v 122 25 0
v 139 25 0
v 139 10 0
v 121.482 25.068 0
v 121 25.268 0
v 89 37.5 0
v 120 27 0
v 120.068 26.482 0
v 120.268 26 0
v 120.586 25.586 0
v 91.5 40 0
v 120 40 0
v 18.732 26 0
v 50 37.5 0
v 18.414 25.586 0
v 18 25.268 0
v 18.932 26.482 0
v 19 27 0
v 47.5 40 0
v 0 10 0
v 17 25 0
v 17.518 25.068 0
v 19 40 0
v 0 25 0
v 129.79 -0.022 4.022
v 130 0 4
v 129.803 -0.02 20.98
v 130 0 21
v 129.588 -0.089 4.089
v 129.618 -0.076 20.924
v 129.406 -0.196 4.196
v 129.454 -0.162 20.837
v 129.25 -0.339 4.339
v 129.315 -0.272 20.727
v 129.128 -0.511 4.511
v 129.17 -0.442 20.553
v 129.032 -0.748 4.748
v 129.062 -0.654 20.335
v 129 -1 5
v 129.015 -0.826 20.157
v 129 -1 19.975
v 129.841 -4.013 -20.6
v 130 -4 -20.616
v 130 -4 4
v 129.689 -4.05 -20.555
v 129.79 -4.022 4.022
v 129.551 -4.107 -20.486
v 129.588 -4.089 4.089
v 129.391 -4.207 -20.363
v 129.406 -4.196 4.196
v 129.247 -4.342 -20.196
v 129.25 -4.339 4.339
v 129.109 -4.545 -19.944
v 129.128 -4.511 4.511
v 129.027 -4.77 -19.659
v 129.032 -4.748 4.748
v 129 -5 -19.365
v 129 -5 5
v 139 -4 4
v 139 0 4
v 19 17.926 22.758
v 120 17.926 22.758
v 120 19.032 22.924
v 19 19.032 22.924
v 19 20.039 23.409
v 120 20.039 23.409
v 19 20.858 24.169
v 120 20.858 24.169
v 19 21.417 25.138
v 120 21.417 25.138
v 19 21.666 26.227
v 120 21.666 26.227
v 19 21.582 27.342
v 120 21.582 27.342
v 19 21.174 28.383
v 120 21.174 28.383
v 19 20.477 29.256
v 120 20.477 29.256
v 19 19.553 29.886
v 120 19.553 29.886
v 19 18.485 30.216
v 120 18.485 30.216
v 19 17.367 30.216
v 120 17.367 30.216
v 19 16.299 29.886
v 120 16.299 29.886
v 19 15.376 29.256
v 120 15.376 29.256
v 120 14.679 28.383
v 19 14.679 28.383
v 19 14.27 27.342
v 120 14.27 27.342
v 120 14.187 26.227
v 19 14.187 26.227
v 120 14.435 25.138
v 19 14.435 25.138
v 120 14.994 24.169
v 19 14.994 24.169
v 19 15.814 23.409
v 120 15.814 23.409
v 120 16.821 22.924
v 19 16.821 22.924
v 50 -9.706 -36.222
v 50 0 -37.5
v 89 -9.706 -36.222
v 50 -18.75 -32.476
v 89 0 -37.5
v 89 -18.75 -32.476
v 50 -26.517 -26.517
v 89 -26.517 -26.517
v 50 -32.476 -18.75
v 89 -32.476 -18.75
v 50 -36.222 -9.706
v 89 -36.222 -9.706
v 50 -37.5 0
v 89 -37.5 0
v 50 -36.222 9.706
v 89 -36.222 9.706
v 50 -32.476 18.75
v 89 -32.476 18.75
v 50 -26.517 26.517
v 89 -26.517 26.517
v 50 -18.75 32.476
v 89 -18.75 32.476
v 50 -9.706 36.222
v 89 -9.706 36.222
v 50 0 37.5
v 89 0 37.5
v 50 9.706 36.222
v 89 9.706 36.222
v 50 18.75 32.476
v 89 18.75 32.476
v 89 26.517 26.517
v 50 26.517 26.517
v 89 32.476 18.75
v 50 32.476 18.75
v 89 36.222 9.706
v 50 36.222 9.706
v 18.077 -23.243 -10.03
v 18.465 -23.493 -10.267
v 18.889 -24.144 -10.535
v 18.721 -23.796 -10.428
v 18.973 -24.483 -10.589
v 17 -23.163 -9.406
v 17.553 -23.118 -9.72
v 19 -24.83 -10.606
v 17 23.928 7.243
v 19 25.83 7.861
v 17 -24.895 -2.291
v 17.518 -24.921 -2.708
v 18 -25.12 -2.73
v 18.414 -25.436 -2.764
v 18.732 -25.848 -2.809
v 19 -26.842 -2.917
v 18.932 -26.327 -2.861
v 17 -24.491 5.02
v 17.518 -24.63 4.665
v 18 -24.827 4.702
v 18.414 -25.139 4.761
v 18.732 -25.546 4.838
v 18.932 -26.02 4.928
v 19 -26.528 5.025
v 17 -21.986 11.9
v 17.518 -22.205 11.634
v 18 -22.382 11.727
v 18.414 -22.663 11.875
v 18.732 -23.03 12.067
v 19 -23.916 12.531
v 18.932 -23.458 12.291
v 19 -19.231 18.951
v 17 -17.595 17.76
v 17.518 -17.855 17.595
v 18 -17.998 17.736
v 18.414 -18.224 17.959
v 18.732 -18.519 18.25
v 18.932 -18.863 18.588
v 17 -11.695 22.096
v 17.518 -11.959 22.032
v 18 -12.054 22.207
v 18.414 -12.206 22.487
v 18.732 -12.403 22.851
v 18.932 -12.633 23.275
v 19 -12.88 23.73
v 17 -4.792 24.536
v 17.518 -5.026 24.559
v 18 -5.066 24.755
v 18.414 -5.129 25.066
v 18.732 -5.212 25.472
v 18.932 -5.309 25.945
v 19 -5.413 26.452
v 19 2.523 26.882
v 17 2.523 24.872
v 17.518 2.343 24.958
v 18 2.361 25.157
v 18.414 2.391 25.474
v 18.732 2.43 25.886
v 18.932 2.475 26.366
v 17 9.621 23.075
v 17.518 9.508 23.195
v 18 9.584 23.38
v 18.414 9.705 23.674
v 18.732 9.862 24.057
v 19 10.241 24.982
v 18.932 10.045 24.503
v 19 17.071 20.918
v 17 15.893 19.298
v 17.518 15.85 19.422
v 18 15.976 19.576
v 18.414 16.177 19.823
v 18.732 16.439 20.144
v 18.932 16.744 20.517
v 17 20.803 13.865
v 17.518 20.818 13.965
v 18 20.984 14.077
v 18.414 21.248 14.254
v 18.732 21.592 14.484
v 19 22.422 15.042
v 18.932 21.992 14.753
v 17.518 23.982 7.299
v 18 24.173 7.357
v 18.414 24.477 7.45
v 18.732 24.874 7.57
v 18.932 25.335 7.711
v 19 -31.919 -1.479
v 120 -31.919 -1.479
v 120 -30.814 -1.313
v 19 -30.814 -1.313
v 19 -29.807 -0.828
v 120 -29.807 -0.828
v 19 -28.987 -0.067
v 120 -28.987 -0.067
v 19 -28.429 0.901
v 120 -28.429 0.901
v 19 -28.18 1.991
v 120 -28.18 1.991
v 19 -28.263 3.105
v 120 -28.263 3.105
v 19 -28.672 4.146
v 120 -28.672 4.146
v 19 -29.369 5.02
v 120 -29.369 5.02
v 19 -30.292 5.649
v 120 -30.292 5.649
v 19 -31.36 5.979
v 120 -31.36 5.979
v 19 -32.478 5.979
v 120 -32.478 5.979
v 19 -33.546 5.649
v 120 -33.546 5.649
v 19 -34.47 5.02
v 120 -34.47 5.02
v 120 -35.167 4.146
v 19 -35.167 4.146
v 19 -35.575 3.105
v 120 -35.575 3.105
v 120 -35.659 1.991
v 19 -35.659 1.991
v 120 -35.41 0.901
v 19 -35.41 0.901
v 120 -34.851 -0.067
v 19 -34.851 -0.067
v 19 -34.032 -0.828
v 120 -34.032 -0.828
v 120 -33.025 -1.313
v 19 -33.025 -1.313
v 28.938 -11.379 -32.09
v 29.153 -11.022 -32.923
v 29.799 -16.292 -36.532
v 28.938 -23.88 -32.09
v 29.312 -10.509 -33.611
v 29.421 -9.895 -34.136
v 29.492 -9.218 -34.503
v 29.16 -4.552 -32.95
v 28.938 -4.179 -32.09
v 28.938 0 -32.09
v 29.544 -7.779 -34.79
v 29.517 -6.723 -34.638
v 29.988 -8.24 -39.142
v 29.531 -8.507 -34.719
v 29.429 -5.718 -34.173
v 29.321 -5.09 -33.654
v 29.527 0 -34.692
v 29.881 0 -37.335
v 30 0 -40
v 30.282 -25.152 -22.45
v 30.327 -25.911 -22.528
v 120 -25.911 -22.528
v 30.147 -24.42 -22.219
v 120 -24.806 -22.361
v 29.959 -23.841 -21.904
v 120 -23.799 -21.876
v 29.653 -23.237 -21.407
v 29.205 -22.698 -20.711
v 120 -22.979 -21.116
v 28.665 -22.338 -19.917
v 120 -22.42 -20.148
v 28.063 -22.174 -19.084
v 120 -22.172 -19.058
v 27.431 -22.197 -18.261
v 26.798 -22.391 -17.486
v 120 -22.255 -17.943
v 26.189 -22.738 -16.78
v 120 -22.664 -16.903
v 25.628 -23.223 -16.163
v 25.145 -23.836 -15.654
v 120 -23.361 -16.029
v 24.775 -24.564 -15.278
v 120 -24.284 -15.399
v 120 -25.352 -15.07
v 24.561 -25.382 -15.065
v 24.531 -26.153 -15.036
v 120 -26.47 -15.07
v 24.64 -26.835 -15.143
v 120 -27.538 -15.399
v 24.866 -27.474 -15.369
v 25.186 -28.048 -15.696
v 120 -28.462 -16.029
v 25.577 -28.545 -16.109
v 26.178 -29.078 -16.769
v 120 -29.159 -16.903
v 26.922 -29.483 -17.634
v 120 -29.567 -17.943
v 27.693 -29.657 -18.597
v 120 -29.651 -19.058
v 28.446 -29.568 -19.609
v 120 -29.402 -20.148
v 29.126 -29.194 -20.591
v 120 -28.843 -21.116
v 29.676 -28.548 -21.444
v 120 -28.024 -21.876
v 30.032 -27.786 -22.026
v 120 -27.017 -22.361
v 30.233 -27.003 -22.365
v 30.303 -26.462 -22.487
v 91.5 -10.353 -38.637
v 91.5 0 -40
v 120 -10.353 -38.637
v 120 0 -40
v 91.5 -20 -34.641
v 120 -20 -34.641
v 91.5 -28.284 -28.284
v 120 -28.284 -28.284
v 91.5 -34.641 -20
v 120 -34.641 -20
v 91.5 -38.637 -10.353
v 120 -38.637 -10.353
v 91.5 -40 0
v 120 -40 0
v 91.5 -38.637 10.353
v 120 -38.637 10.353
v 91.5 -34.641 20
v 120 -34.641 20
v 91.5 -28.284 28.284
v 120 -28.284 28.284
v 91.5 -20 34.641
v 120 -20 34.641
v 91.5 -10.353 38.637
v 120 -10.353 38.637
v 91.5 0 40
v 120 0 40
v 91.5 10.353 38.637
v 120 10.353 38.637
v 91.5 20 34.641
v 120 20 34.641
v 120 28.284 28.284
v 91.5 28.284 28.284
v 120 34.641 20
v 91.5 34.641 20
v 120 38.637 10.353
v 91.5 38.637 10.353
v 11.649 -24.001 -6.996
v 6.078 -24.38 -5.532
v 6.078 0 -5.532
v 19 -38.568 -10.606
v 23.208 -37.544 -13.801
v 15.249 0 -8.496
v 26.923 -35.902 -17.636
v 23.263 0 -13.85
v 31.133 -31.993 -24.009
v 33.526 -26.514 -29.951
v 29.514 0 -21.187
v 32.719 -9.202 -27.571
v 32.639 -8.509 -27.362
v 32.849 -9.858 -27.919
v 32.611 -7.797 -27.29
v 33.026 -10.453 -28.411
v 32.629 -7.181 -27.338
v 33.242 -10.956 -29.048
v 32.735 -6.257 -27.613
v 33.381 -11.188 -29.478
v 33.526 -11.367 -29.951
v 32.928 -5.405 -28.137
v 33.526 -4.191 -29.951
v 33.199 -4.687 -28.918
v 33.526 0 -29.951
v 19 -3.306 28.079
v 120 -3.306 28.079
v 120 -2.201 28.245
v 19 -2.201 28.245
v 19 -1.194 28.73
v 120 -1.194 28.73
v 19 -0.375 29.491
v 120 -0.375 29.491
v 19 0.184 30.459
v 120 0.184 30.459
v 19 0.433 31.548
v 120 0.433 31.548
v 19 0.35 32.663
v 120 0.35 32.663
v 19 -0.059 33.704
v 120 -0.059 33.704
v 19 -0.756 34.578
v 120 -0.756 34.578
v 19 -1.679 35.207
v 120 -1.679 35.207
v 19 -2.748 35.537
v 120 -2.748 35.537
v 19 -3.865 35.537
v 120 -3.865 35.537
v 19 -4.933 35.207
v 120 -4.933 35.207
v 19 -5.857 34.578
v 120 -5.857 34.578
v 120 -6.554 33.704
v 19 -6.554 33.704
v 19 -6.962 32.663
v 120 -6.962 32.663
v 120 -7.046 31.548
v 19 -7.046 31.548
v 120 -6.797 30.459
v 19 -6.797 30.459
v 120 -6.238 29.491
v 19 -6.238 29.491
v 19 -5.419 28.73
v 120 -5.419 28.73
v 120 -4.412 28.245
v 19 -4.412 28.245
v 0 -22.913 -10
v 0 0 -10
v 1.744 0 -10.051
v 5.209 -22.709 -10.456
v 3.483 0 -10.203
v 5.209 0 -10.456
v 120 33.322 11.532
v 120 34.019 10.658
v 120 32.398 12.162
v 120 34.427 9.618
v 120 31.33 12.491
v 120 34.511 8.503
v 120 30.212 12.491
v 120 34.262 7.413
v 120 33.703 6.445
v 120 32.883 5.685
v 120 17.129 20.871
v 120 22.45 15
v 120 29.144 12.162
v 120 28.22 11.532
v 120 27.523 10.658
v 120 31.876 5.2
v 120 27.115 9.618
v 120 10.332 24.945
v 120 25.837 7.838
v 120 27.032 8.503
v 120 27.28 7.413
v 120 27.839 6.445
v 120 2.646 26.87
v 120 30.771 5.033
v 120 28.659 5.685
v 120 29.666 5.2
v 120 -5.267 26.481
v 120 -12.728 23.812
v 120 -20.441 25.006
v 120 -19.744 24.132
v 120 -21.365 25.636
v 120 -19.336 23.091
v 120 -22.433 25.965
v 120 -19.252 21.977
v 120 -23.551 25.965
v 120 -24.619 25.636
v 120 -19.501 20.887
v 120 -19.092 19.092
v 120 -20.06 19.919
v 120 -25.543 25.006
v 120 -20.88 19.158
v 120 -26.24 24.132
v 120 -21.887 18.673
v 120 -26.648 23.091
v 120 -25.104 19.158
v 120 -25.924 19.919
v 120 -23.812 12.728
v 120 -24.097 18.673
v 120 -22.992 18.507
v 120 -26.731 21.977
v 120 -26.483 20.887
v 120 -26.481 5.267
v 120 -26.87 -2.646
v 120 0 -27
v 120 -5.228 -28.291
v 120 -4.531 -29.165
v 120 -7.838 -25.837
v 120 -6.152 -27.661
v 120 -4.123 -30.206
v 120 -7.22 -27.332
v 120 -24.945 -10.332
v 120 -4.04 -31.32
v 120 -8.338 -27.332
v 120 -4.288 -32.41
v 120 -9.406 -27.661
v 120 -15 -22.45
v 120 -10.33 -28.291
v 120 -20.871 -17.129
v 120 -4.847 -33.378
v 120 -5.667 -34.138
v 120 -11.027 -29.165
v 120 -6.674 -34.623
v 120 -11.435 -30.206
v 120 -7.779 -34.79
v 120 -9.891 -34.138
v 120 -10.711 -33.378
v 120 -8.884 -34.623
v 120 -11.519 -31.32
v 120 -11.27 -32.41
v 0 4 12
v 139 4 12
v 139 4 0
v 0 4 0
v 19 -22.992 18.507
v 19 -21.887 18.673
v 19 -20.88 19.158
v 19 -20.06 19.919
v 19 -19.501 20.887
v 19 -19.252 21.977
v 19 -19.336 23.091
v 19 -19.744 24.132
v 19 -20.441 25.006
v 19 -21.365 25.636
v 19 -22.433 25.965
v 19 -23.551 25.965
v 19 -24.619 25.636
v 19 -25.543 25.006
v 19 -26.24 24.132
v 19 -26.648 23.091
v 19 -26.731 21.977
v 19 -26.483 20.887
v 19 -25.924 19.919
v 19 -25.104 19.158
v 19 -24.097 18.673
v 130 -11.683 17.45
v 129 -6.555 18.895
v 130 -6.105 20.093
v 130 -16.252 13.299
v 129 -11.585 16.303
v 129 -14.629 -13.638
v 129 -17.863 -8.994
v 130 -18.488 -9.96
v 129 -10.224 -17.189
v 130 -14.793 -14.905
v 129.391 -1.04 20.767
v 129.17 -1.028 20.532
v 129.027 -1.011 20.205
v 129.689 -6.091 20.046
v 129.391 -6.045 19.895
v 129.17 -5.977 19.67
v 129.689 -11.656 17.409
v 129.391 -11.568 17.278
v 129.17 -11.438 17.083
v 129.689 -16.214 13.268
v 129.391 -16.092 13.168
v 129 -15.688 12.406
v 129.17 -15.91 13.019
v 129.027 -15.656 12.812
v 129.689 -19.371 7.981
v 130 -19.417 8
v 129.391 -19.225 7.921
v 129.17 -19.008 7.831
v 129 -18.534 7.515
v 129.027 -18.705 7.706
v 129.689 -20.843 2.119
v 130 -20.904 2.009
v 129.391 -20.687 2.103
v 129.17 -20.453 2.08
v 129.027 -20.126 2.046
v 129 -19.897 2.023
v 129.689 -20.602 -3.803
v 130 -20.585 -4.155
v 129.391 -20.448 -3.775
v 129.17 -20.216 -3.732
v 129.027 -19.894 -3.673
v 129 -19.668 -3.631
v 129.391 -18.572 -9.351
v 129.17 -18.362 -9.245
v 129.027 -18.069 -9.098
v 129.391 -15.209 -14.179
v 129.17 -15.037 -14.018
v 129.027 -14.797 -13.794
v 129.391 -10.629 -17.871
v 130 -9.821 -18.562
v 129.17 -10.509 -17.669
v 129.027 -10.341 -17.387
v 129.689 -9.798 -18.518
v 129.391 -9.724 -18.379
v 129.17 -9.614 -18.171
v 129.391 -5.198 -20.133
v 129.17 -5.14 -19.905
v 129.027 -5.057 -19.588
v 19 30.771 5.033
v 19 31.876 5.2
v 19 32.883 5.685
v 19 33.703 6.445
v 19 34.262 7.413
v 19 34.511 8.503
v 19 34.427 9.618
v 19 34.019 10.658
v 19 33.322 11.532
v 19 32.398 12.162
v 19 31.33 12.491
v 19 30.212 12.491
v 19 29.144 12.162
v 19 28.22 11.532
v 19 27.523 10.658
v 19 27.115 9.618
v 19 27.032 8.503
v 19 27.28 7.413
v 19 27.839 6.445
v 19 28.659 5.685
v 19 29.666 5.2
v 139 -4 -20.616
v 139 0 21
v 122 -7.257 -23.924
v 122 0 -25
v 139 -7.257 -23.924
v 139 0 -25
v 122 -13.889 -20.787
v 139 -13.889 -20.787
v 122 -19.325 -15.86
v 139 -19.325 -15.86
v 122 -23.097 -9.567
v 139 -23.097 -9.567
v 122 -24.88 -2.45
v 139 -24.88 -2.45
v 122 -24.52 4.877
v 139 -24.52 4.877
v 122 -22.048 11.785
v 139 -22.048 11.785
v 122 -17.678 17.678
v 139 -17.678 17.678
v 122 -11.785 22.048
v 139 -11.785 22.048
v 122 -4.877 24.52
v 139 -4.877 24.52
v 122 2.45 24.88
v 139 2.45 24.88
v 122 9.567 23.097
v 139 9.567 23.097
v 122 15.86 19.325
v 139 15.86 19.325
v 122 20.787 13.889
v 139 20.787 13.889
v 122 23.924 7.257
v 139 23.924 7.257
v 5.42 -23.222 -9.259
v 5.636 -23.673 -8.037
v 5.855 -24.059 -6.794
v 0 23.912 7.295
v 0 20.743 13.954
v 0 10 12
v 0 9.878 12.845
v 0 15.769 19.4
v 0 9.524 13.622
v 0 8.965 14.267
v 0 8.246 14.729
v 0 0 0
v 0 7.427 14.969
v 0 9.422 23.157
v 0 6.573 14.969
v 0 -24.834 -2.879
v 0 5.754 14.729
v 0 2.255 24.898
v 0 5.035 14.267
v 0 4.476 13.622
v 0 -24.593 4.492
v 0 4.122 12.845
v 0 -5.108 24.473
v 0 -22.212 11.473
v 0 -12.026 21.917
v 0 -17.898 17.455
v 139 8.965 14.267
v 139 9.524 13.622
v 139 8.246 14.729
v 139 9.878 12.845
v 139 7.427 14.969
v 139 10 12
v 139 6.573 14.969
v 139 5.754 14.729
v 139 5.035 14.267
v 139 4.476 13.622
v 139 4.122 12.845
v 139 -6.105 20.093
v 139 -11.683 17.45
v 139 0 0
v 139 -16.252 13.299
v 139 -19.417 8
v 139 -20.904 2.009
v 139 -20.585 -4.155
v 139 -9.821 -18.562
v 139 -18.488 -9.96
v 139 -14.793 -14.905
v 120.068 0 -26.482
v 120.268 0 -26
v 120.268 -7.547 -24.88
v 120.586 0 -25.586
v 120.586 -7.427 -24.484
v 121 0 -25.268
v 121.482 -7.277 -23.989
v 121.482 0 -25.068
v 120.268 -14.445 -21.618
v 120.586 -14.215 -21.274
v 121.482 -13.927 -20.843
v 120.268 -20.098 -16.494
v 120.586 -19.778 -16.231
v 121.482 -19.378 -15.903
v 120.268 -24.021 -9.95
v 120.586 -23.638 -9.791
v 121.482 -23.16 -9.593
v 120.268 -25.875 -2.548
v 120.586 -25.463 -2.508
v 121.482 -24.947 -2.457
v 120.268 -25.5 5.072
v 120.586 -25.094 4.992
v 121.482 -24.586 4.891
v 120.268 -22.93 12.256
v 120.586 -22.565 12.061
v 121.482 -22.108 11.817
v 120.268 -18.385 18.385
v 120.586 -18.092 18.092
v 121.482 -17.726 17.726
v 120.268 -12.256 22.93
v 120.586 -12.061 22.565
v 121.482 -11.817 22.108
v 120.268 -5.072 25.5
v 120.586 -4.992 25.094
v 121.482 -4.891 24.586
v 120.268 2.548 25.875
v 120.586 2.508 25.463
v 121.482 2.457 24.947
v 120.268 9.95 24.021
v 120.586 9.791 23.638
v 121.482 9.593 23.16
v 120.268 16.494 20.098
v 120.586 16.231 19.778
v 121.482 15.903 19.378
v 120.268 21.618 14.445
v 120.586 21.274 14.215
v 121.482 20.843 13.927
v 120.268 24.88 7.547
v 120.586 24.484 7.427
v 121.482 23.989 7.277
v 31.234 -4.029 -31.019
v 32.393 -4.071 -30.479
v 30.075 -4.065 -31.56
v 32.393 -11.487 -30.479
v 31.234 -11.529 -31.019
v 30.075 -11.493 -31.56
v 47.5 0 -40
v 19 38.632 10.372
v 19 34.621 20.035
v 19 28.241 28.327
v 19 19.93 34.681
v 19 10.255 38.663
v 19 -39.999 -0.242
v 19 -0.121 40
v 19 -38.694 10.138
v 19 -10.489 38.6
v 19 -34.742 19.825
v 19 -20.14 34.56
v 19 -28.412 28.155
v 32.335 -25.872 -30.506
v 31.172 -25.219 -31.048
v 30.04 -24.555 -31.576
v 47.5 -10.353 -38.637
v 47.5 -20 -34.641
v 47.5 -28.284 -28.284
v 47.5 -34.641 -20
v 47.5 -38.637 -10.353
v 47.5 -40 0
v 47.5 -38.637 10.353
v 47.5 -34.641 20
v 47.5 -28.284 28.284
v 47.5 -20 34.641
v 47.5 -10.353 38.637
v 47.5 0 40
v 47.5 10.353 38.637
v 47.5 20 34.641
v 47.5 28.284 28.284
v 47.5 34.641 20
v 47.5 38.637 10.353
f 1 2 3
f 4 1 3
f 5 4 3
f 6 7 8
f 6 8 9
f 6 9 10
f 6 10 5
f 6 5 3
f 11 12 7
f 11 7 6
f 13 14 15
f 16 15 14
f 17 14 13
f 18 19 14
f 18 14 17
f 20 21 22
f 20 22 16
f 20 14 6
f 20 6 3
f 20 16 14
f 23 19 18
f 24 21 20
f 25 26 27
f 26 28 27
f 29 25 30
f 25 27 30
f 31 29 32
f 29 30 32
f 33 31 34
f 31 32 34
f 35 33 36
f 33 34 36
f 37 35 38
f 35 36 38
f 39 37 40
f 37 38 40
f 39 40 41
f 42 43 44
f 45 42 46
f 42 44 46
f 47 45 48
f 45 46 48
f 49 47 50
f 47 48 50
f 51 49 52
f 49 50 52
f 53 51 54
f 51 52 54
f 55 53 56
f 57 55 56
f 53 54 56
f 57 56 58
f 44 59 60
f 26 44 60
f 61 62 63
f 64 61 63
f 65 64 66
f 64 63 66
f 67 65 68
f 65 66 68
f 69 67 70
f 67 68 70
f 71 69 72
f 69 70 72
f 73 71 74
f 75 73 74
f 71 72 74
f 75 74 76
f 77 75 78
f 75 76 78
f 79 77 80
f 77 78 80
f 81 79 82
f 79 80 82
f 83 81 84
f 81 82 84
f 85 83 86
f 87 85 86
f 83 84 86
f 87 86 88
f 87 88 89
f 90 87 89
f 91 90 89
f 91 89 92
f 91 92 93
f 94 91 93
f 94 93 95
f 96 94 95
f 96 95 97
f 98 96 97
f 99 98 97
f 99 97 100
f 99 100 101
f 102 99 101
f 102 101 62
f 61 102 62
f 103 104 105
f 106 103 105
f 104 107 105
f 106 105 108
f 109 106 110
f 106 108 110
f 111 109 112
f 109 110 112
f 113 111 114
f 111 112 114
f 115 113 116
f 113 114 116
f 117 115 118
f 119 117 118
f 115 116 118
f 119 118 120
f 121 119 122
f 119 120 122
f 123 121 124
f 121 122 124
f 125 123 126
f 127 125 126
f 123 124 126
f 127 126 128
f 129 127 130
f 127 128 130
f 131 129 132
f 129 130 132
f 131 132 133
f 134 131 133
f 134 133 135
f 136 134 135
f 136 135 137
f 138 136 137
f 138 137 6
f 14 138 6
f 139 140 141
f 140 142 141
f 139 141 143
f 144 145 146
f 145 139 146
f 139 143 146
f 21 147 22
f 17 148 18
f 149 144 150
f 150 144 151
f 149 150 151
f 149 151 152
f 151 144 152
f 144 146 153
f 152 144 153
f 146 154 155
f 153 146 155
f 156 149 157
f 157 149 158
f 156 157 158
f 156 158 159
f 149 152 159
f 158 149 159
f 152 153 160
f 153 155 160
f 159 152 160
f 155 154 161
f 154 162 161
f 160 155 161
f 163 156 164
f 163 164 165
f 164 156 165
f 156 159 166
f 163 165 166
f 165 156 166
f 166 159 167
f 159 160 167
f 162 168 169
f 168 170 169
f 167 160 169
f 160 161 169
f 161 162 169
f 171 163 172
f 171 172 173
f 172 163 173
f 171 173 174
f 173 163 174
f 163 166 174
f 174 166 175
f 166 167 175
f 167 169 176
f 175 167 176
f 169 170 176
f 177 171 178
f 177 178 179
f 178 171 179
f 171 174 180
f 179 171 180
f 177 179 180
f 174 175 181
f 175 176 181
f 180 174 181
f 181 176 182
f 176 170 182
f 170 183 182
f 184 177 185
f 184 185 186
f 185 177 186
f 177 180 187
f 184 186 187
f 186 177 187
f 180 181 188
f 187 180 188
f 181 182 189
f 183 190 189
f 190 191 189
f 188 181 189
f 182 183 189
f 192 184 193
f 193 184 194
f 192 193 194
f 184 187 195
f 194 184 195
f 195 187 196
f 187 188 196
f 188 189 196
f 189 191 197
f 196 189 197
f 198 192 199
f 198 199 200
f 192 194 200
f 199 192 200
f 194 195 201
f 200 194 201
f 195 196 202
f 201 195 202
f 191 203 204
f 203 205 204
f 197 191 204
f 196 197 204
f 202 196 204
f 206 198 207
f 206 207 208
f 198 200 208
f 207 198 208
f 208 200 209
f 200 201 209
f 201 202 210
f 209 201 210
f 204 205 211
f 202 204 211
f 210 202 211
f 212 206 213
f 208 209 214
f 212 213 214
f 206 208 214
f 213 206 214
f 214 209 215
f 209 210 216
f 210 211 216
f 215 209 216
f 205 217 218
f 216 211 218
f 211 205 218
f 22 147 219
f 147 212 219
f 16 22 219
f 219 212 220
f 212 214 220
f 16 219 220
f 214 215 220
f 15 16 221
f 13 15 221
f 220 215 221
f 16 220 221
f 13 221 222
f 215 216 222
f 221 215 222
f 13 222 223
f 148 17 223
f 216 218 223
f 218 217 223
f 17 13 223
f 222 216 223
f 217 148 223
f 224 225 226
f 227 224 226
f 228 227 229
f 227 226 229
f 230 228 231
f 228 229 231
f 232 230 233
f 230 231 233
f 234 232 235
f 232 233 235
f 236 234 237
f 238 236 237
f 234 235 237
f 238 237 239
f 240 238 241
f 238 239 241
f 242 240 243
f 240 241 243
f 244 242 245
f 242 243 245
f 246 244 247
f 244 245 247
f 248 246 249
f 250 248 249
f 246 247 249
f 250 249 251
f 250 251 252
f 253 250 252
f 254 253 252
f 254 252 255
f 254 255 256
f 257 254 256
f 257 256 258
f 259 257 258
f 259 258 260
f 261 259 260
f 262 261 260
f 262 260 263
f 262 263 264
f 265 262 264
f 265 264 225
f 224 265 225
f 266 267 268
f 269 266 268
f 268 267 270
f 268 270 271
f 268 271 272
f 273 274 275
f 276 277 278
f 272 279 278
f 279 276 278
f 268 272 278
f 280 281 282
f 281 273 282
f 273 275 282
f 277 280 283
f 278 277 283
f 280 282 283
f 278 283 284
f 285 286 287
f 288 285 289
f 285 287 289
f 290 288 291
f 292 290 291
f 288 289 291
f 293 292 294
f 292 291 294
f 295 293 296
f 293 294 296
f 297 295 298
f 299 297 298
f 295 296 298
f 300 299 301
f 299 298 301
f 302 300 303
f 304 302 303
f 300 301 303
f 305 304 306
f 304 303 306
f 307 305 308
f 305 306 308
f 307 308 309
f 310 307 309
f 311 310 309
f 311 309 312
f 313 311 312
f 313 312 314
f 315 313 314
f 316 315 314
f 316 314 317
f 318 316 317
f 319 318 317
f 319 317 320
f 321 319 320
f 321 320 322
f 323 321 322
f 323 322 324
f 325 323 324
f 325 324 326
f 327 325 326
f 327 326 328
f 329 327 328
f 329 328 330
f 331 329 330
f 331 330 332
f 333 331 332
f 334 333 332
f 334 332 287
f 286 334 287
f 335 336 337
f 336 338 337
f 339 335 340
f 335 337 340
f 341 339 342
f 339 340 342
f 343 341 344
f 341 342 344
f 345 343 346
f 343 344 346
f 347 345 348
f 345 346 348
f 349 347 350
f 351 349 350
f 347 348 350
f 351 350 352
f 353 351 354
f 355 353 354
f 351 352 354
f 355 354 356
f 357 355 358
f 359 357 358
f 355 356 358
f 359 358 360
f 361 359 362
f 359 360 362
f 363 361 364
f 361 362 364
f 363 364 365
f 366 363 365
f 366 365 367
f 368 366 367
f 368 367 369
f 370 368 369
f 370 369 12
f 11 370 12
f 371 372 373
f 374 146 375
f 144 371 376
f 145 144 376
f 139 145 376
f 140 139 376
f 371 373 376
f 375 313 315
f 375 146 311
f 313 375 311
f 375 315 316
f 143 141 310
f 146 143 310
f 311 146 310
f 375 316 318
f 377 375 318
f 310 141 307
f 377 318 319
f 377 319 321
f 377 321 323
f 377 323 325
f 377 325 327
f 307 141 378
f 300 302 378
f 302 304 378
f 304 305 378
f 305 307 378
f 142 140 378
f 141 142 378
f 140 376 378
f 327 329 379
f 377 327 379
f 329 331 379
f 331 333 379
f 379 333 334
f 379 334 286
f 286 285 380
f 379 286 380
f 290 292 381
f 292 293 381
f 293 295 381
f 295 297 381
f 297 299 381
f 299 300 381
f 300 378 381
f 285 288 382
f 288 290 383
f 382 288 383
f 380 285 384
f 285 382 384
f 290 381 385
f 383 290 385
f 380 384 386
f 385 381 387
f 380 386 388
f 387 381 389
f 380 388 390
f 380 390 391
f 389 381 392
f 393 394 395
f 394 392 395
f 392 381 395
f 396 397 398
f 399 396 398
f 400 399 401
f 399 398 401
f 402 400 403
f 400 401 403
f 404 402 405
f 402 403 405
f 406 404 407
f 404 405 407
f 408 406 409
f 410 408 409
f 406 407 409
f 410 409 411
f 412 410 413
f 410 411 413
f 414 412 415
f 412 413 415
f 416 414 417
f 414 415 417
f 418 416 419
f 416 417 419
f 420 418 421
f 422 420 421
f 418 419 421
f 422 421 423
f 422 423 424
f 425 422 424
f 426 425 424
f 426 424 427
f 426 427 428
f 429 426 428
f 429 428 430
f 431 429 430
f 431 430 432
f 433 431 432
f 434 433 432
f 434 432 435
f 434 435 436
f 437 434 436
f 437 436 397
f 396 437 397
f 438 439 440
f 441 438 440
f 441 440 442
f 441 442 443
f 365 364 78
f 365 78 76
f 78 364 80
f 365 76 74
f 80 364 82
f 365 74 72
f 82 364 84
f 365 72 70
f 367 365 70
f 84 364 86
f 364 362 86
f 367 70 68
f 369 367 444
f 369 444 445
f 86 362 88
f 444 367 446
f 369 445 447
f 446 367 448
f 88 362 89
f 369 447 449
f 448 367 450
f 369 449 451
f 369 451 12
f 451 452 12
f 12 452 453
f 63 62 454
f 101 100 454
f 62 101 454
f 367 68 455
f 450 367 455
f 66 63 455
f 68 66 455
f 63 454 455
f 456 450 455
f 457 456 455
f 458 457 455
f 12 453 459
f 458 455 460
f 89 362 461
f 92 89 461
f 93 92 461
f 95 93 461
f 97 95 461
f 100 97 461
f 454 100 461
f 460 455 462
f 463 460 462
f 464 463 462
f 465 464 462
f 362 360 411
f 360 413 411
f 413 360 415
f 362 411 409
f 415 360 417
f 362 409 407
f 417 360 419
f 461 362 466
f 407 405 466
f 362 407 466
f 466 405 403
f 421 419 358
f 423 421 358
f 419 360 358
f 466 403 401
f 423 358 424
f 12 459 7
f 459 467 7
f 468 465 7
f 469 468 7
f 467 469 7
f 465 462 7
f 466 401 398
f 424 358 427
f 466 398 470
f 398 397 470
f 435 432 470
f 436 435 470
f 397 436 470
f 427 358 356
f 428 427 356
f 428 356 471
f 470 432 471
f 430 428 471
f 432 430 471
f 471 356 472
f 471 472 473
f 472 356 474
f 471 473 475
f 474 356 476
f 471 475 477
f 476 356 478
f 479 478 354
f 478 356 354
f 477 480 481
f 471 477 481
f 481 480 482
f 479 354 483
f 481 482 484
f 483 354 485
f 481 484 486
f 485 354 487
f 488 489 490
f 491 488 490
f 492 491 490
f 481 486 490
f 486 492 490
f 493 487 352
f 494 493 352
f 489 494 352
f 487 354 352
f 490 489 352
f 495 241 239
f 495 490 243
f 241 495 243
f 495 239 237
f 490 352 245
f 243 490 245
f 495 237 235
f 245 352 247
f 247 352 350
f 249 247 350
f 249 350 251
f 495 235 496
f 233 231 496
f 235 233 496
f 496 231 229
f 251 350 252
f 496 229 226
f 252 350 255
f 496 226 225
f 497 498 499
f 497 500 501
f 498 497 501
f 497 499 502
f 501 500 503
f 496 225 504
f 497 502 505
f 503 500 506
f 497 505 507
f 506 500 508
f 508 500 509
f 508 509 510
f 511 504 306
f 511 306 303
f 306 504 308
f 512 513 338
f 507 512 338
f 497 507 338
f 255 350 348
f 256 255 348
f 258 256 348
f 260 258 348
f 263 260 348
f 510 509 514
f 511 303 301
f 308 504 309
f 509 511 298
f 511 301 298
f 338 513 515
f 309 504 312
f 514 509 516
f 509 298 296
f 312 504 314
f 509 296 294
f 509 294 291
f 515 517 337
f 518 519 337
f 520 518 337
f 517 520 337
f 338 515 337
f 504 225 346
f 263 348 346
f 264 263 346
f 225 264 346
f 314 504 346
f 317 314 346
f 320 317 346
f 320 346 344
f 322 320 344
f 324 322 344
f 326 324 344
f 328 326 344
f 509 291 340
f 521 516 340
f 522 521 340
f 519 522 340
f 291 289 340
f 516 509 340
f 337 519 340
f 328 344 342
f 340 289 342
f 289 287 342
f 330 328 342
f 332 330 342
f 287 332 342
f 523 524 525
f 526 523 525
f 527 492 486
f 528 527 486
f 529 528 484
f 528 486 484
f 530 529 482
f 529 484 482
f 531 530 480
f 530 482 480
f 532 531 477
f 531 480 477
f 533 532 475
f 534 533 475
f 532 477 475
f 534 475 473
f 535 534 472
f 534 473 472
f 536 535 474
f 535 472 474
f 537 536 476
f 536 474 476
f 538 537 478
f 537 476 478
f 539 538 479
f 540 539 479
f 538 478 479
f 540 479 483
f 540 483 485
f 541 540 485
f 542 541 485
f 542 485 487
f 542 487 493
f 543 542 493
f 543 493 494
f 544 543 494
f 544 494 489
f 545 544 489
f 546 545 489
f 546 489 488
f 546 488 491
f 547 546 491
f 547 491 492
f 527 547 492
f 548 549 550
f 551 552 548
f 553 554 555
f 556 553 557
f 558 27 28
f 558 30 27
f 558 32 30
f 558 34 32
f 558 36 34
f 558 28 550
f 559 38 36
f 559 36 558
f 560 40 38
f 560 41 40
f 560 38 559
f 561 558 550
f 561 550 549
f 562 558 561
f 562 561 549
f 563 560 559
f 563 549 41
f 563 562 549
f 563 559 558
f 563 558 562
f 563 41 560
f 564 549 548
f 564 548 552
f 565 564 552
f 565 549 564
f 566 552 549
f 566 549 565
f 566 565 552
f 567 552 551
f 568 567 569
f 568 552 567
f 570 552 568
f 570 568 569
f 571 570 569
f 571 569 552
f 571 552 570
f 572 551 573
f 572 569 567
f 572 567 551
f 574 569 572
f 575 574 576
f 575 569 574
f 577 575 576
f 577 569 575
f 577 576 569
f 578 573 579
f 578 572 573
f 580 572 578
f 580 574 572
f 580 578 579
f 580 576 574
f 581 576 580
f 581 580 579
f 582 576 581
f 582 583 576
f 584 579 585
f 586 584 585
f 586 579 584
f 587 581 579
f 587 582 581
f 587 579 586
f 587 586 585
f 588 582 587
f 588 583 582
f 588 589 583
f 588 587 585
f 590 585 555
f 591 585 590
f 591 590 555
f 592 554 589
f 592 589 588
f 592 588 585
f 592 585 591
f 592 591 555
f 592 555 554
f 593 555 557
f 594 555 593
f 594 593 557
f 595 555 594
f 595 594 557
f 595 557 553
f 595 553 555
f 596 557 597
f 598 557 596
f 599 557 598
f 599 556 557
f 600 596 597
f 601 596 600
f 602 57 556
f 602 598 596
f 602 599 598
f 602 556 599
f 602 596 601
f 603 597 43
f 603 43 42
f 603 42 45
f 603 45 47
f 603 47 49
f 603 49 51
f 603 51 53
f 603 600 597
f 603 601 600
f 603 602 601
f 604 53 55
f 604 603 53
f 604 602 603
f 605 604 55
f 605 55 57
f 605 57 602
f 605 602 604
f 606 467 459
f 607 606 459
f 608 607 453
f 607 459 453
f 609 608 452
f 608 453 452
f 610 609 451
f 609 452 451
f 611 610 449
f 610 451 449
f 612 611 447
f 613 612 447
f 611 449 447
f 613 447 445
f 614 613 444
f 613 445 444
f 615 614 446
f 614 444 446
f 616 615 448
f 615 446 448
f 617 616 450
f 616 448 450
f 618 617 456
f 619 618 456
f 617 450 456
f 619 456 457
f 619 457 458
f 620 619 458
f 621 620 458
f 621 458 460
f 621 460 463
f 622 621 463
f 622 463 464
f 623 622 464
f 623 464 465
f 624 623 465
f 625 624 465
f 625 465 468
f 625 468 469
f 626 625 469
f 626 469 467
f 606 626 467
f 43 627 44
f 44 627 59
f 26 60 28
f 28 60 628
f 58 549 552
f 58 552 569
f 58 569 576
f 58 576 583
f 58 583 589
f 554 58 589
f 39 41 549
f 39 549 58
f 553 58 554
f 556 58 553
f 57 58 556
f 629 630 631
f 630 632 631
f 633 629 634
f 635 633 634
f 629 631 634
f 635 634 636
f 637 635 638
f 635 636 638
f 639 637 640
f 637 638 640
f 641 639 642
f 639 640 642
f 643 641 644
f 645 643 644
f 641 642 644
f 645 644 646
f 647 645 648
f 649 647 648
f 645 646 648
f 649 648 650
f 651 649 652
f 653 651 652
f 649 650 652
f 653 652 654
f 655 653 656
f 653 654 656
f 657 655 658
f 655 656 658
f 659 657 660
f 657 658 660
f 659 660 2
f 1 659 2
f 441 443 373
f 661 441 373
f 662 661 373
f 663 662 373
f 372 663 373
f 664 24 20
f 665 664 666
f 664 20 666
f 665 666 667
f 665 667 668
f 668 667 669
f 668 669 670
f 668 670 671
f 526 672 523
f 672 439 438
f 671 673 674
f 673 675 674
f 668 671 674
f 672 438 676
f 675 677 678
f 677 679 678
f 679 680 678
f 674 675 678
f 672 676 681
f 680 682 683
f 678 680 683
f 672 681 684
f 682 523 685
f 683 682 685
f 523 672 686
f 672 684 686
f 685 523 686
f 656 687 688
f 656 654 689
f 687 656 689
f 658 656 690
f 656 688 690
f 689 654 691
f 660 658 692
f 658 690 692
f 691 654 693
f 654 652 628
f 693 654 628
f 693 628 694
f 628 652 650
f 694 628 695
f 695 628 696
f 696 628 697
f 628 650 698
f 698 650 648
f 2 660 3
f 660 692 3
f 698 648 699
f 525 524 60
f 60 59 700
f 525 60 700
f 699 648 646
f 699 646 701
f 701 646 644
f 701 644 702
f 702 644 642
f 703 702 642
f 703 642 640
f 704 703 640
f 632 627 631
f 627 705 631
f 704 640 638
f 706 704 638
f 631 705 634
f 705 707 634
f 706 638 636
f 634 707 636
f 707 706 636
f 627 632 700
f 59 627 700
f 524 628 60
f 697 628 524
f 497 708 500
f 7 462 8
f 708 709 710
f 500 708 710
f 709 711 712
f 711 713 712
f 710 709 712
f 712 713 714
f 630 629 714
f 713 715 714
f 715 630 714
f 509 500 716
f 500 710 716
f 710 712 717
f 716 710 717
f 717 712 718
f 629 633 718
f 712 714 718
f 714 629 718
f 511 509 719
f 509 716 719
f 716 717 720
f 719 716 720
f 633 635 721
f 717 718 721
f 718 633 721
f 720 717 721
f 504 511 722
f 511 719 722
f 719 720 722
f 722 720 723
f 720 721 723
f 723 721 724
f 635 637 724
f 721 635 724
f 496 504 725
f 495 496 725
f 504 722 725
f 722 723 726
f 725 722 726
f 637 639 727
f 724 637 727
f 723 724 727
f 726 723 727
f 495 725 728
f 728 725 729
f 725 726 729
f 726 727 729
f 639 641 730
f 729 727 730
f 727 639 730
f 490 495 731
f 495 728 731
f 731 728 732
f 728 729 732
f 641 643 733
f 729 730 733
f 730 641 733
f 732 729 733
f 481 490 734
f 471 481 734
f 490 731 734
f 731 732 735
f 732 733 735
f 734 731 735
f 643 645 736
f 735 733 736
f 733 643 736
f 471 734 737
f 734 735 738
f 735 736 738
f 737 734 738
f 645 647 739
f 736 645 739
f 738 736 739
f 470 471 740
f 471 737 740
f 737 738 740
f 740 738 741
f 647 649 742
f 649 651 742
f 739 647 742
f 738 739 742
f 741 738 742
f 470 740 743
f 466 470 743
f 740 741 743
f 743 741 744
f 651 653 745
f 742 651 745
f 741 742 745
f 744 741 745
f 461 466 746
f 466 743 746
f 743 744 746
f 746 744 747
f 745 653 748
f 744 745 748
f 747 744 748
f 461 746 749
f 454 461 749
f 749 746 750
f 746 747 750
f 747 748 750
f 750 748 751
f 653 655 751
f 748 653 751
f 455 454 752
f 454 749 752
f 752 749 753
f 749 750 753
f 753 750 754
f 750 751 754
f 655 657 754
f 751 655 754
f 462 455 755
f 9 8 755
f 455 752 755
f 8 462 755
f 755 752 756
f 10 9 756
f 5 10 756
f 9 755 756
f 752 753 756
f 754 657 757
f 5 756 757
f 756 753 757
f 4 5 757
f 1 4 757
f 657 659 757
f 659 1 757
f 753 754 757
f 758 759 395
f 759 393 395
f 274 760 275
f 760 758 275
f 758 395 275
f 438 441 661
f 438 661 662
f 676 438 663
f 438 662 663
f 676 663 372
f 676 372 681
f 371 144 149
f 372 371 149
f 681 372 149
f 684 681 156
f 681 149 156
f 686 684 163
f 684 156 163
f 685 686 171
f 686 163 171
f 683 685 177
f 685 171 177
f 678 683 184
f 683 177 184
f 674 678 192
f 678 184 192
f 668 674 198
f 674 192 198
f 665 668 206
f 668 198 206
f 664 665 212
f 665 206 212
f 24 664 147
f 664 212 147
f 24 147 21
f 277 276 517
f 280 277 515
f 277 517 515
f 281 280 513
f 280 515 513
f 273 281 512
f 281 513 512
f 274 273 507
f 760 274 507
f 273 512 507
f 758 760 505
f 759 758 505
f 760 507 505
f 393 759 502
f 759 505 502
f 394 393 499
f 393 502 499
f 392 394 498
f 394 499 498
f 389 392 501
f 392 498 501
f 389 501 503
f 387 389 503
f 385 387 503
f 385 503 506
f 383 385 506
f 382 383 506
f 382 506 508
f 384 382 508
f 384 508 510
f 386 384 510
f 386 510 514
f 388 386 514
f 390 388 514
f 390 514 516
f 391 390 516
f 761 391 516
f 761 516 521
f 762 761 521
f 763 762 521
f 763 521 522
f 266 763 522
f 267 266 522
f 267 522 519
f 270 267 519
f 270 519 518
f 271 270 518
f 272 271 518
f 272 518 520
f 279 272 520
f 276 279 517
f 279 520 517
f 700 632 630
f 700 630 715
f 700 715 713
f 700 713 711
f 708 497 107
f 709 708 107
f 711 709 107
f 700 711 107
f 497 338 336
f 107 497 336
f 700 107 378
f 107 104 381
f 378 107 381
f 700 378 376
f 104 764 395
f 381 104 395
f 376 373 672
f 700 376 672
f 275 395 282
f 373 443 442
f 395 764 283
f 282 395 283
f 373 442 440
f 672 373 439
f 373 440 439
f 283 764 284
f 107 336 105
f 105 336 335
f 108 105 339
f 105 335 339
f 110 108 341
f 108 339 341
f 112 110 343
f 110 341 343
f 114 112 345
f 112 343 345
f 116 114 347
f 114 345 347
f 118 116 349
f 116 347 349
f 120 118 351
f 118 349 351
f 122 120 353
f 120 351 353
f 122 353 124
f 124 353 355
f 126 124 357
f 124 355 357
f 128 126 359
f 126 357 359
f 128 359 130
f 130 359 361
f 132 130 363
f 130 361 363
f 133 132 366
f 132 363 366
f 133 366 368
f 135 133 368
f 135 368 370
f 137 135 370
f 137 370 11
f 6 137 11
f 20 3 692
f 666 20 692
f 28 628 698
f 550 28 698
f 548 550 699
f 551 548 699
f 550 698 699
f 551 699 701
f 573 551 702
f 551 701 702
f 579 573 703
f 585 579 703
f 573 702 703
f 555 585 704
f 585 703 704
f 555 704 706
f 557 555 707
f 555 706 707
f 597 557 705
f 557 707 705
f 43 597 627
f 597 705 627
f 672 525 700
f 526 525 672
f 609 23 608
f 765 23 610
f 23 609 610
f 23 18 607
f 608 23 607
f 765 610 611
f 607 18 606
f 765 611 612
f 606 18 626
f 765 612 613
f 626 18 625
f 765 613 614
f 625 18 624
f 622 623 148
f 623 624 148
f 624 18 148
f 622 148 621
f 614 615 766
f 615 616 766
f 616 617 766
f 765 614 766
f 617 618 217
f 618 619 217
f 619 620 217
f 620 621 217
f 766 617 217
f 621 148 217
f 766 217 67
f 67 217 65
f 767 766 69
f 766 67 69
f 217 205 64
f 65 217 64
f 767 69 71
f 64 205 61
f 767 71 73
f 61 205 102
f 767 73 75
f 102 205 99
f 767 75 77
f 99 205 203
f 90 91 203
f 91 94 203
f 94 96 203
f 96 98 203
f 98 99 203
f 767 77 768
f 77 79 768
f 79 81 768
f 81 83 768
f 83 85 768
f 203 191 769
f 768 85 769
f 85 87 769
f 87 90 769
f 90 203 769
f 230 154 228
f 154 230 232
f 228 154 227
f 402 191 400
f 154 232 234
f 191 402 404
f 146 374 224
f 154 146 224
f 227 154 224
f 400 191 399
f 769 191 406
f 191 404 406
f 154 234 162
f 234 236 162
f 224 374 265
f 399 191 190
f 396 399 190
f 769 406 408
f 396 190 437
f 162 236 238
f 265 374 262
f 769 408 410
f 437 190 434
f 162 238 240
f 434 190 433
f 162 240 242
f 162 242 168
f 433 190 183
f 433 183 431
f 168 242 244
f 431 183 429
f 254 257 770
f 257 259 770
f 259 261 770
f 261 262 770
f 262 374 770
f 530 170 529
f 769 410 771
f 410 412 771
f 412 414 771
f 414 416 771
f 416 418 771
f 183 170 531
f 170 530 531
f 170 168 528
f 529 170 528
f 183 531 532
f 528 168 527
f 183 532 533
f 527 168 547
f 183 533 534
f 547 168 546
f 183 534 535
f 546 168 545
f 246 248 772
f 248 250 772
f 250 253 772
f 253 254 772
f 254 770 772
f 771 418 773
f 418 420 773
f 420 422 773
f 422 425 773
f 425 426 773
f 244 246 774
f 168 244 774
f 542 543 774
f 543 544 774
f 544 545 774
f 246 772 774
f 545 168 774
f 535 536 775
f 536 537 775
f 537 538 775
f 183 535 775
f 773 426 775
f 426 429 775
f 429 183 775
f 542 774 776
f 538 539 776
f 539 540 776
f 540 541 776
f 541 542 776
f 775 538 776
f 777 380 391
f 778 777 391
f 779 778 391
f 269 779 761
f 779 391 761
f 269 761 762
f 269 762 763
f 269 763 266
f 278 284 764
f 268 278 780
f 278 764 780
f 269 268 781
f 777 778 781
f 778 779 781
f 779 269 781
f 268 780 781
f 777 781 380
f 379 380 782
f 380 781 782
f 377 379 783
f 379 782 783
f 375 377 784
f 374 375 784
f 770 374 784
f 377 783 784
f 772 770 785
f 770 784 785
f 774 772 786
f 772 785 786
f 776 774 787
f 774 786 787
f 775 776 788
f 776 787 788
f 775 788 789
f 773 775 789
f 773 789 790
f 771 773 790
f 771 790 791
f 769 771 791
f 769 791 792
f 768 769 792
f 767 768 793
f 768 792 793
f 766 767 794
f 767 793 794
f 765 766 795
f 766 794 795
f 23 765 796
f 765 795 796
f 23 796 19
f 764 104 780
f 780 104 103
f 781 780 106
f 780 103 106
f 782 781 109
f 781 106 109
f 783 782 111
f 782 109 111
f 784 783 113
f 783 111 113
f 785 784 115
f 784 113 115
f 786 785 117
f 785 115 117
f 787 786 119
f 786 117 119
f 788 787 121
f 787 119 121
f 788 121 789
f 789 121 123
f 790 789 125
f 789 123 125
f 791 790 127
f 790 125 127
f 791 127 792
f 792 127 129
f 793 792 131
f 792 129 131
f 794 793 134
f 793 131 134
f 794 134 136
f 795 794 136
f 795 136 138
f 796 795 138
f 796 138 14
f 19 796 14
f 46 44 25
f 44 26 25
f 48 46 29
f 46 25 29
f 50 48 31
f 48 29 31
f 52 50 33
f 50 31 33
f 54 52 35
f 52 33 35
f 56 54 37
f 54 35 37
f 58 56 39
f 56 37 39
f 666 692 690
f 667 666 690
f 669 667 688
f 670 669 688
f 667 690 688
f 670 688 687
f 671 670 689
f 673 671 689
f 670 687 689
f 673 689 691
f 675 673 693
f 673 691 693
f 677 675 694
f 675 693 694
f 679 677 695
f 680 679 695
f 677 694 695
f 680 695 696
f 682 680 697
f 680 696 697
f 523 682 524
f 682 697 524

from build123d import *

# Parameters (mm, degrees)
REVOLVE2_ANGLE     = 270
CUT_EXTRUDE1_REACH = 141
CUT_EXTRUDE2_REACH = 122
SKETCH3_R          = 3.75
CUT_EXTRUDE3_DEPTH = 41
CUT_EXTRUDE4_DEPTH = 10
FILLET1_R          = 1


with BuildPart() as part:
    # Sketch1 → Revolve2 (revolve)
    with BuildSketch(Plane(origin=(0, 0, 0), x_dir=(1, 0, 0), z_dir=(0, 1, 0))):
        with BuildLine():
            Line((0, 0), (0, 25))
            Line((0, 25), (17, 25))
            ThreePointArc((17, 25), (18.414213562, 25.585786438), (19, 27))
            Line((19, 27), (19, 40))
            Line((19, 40), (47.5, 40))
            Line((47.5, 40), (50, 37.5))
            Line((50, 37.5), (89, 37.5))
            Line((89, 37.5), (91.5, 40))
            Line((91.5, 40), (120, 40))
            Line((120, 40), (120, 27))
            ThreePointArc((120, 27), (120.585786438, 25.585786438), (122, 25))
            Line((122, 25), (139, 25))
            Line((139, 25), (139, 0))
            Line((139, 0), (0, 0))
        make_face()
    revolve(axis=Axis((139, 0, 0), (-1, 0, 0)), revolution_arc=REVOLVE2_ANGLE)

    # Sketch2 → Cut-Extrude1 (cut, up to next)
    with BuildSketch(Plane(origin=(139, 0, 0), x_dir=(0, 0, -1), z_dir=(1, 0, 0)), mode=Mode.PRIVATE) as cut_extrude1_sk1:
        with BuildLine():
            Line((-12, 4), (0, 4))
            Line((0, 4), (0, 10))
            Line((0, 10), (-12, 10))
            ThreePointArc((-12, 10), (-15, 7), (-12, 4))
        make_face()
    cut_extrude1_tool1 = extrude(cut_extrude1_sk1.sketch, amount=-CUT_EXTRUDE1_REACH, mode=Mode.PRIVATE) & part.part
    add(cut_extrude1_tool1.solids().sort_by_distance((139, 7, 7.193712))[0], mode=Mode.SUBTRACT)

    # Sketch3 → Cut-Extrude2 (cut, up to next)
    with BuildSketch(Plane(origin=(120, 0, 0), x_dir=(0, 0, -1), z_dir=(1, 0, 0)), mode=Mode.PRIVATE) as cut_extrude2_sk1:
        with Locations((-8.783194418, 30.77101714)):
            Circle(SKETCH3_R)
    cut_extrude2_tool1 = extrude(cut_extrude2_sk1.sketch, amount=-CUT_EXTRUDE2_REACH, mode=Mode.PRIVATE) & part.part
    add(cut_extrude2_tool1.solids().sort_by_distance((120, 30.771017, 8.783194))[0], mode=Mode.SUBTRACT)
    # Sketch3 → Cut-Extrude2 (cut, up to next)
    with BuildSketch(Plane(origin=(120, 0, 0), x_dir=(0, 0, -1), z_dir=(1, 0, 0)), mode=Mode.PRIVATE) as cut_extrude2_sk2:
        with Locations((31.040079752, -7.779039077)):
            Circle(SKETCH3_R)
    cut_extrude2_tool2 = extrude(cut_extrude2_sk2.sketch, amount=-CUT_EXTRUDE2_REACH, mode=Mode.PRIVATE) & part.part
    add(cut_extrude2_tool2.solids().sort_by_distance((120, -7.779039, -31.04008))[0], mode=Mode.SUBTRACT)
    # Sketch3 → Cut-Extrude2 (cut, up to next)
    with BuildSketch(Plane(origin=(120, 0, 0), x_dir=(0, 0, -1), z_dir=(1, 0, 0)), mode=Mode.PRIVATE) as cut_extrude2_sk3:
        with Locations((18.777810674, -25.911268327)):
            Circle(SKETCH3_R)
    cut_extrude2_tool3 = extrude(cut_extrude2_sk3.sketch, amount=-CUT_EXTRUDE2_REACH, mode=Mode.PRIVATE) & part.part
    add(cut_extrude2_tool3.solids().sort_by_distance((120, -25.911268, -18.777811))[0], mode=Mode.SUBTRACT)
    # Sketch3 → Cut-Extrude2 (cut, up to next)
    with BuildSketch(Plane(origin=(120, 0, 0), x_dir=(0, 0, -1), z_dir=(1, 0, 0)), mode=Mode.PRIVATE) as cut_extrude2_sk4:
        with Locations((-2.270804711, -31.919327154)):
            Circle(SKETCH3_R)
    cut_extrude2_tool4 = extrude(cut_extrude2_sk4.sketch, amount=-CUT_EXTRUDE2_REACH, mode=Mode.PRIVATE) & part.part
    add(cut_extrude2_tool4.solids().sort_by_distance((120, -31.919327, 2.270805))[0], mode=Mode.SUBTRACT)
    # Sketch3 → Cut-Extrude2 (cut, up to next)
    with BuildSketch(Plane(origin=(120, 0, 0), x_dir=(0, 0, -1), z_dir=(1, 0, 0)), mode=Mode.PRIVATE) as cut_extrude2_sk5:
        with Locations((-22.256885334, -22.991978062)):
            Circle(SKETCH3_R)
    cut_extrude2_tool5 = extrude(cut_extrude2_sk5.sketch, amount=-CUT_EXTRUDE2_REACH, mode=Mode.PRIVATE) & part.part
    add(cut_extrude2_tool5.solids().sort_by_distance((120, -22.991978, 22.256885))[0], mode=Mode.SUBTRACT)
    # Sketch3 → Cut-Extrude2 (cut, up to next)
    with BuildSketch(Plane(origin=(120, 0, 0), x_dir=(0, 0, -1), z_dir=(1, 0, 0)), mode=Mode.PRIVATE) as cut_extrude2_sk6:
        with Locations((-31.828721952, -3.306426908)):
            Circle(SKETCH3_R)
    cut_extrude2_tool6 = extrude(cut_extrude2_sk6.sketch, amount=-CUT_EXTRUDE2_REACH, mode=Mode.PRIVATE) & part.part
    add(cut_extrude2_tool6.solids().sort_by_distance((120, -3.306427, 31.828722))[0], mode=Mode.SUBTRACT)
    # Sketch3 → Cut-Extrude2 (cut, up to next)
    with BuildSketch(Plane(origin=(120, 0, 0), x_dir=(0, 0, -1), z_dir=(1, 0, 0)), mode=Mode.PRIVATE) as cut_extrude2_sk7:
        with Locations((-26.507545832, 17.926238144)):
            Circle(SKETCH3_R)
    cut_extrude2_tool7 = extrude(cut_extrude2_sk7.sketch, amount=-CUT_EXTRUDE2_REACH, mode=Mode.PRIVATE) & part.part
    add(cut_extrude2_tool7.solids().sort_by_distance((120, 17.926238, 26.507546))[0], mode=Mode.SUBTRACT)

    # Sketch4 → Cut-Extrude3 (cut, through all)
    with BuildSketch(Plane(origin=(0, 0, 0), x_dir=(1, 0, 0), z_dir=(0, 1, 0))):
        with BuildLine():
            Line((0, 40), (0, 10))
            ThreePointArc((0, 10), (2.614672282, 10.114159057), (5.20944533, 10.45576741))
            Line((5.20944533, 10.45576741), (6.077686218, 5.531728645))
            ThreePointArc((6.077686218, 5.531728645), (23.263426891, 13.850182233), (33.526230894, 29.950530259))
            Line((33.526230894, 29.950530259), (28.938382586, 32.089879059))
            ThreePointArc((28.938382586, 32.089879059), (29.733411153, 36.00947858), (30, 40))
            Line((30, 40), (0, 40))
        make_face()
    extrude(amount=-CUT_EXTRUDE3_DEPTH, mode=Mode.SUBTRACT)

    # Sketch5 → Cut-Extrude4 (cut)
    with BuildSketch(Plane(origin=(139, 0, 0), x_dir=(0, 0, -1), z_dir=(1, 0, 0))):
        with BuildLine():
            Line((-4, 0), (-12, 0))
            Line((-12, 0), (-21, 0))
            ThreePointArc((-21, 0), (-2.009217424, -20.903661051), (20.615528128, -4))
            Line((20.615528128, -4), (0, -4))
            Line((0, -4), (-4, -4))
            Line((-4, -4), (-4, 0))
        make_face()
    extrude(amount=-CUT_EXTRUDE4_DEPTH, mode=Mode.SUBTRACT)

    # Fillet1
    fillet1_edges = [part.edges().sort_by_distance(p)[0] for p in [
        (129, 0, 12.5),
        (129, -4, -8.307764064),
        (129, -20.903661051, 2.009217424),
        (129, -2, 4),
    ]]
    fillet(fillet1_edges, radius=FILLET1_R)


solid = part.part
